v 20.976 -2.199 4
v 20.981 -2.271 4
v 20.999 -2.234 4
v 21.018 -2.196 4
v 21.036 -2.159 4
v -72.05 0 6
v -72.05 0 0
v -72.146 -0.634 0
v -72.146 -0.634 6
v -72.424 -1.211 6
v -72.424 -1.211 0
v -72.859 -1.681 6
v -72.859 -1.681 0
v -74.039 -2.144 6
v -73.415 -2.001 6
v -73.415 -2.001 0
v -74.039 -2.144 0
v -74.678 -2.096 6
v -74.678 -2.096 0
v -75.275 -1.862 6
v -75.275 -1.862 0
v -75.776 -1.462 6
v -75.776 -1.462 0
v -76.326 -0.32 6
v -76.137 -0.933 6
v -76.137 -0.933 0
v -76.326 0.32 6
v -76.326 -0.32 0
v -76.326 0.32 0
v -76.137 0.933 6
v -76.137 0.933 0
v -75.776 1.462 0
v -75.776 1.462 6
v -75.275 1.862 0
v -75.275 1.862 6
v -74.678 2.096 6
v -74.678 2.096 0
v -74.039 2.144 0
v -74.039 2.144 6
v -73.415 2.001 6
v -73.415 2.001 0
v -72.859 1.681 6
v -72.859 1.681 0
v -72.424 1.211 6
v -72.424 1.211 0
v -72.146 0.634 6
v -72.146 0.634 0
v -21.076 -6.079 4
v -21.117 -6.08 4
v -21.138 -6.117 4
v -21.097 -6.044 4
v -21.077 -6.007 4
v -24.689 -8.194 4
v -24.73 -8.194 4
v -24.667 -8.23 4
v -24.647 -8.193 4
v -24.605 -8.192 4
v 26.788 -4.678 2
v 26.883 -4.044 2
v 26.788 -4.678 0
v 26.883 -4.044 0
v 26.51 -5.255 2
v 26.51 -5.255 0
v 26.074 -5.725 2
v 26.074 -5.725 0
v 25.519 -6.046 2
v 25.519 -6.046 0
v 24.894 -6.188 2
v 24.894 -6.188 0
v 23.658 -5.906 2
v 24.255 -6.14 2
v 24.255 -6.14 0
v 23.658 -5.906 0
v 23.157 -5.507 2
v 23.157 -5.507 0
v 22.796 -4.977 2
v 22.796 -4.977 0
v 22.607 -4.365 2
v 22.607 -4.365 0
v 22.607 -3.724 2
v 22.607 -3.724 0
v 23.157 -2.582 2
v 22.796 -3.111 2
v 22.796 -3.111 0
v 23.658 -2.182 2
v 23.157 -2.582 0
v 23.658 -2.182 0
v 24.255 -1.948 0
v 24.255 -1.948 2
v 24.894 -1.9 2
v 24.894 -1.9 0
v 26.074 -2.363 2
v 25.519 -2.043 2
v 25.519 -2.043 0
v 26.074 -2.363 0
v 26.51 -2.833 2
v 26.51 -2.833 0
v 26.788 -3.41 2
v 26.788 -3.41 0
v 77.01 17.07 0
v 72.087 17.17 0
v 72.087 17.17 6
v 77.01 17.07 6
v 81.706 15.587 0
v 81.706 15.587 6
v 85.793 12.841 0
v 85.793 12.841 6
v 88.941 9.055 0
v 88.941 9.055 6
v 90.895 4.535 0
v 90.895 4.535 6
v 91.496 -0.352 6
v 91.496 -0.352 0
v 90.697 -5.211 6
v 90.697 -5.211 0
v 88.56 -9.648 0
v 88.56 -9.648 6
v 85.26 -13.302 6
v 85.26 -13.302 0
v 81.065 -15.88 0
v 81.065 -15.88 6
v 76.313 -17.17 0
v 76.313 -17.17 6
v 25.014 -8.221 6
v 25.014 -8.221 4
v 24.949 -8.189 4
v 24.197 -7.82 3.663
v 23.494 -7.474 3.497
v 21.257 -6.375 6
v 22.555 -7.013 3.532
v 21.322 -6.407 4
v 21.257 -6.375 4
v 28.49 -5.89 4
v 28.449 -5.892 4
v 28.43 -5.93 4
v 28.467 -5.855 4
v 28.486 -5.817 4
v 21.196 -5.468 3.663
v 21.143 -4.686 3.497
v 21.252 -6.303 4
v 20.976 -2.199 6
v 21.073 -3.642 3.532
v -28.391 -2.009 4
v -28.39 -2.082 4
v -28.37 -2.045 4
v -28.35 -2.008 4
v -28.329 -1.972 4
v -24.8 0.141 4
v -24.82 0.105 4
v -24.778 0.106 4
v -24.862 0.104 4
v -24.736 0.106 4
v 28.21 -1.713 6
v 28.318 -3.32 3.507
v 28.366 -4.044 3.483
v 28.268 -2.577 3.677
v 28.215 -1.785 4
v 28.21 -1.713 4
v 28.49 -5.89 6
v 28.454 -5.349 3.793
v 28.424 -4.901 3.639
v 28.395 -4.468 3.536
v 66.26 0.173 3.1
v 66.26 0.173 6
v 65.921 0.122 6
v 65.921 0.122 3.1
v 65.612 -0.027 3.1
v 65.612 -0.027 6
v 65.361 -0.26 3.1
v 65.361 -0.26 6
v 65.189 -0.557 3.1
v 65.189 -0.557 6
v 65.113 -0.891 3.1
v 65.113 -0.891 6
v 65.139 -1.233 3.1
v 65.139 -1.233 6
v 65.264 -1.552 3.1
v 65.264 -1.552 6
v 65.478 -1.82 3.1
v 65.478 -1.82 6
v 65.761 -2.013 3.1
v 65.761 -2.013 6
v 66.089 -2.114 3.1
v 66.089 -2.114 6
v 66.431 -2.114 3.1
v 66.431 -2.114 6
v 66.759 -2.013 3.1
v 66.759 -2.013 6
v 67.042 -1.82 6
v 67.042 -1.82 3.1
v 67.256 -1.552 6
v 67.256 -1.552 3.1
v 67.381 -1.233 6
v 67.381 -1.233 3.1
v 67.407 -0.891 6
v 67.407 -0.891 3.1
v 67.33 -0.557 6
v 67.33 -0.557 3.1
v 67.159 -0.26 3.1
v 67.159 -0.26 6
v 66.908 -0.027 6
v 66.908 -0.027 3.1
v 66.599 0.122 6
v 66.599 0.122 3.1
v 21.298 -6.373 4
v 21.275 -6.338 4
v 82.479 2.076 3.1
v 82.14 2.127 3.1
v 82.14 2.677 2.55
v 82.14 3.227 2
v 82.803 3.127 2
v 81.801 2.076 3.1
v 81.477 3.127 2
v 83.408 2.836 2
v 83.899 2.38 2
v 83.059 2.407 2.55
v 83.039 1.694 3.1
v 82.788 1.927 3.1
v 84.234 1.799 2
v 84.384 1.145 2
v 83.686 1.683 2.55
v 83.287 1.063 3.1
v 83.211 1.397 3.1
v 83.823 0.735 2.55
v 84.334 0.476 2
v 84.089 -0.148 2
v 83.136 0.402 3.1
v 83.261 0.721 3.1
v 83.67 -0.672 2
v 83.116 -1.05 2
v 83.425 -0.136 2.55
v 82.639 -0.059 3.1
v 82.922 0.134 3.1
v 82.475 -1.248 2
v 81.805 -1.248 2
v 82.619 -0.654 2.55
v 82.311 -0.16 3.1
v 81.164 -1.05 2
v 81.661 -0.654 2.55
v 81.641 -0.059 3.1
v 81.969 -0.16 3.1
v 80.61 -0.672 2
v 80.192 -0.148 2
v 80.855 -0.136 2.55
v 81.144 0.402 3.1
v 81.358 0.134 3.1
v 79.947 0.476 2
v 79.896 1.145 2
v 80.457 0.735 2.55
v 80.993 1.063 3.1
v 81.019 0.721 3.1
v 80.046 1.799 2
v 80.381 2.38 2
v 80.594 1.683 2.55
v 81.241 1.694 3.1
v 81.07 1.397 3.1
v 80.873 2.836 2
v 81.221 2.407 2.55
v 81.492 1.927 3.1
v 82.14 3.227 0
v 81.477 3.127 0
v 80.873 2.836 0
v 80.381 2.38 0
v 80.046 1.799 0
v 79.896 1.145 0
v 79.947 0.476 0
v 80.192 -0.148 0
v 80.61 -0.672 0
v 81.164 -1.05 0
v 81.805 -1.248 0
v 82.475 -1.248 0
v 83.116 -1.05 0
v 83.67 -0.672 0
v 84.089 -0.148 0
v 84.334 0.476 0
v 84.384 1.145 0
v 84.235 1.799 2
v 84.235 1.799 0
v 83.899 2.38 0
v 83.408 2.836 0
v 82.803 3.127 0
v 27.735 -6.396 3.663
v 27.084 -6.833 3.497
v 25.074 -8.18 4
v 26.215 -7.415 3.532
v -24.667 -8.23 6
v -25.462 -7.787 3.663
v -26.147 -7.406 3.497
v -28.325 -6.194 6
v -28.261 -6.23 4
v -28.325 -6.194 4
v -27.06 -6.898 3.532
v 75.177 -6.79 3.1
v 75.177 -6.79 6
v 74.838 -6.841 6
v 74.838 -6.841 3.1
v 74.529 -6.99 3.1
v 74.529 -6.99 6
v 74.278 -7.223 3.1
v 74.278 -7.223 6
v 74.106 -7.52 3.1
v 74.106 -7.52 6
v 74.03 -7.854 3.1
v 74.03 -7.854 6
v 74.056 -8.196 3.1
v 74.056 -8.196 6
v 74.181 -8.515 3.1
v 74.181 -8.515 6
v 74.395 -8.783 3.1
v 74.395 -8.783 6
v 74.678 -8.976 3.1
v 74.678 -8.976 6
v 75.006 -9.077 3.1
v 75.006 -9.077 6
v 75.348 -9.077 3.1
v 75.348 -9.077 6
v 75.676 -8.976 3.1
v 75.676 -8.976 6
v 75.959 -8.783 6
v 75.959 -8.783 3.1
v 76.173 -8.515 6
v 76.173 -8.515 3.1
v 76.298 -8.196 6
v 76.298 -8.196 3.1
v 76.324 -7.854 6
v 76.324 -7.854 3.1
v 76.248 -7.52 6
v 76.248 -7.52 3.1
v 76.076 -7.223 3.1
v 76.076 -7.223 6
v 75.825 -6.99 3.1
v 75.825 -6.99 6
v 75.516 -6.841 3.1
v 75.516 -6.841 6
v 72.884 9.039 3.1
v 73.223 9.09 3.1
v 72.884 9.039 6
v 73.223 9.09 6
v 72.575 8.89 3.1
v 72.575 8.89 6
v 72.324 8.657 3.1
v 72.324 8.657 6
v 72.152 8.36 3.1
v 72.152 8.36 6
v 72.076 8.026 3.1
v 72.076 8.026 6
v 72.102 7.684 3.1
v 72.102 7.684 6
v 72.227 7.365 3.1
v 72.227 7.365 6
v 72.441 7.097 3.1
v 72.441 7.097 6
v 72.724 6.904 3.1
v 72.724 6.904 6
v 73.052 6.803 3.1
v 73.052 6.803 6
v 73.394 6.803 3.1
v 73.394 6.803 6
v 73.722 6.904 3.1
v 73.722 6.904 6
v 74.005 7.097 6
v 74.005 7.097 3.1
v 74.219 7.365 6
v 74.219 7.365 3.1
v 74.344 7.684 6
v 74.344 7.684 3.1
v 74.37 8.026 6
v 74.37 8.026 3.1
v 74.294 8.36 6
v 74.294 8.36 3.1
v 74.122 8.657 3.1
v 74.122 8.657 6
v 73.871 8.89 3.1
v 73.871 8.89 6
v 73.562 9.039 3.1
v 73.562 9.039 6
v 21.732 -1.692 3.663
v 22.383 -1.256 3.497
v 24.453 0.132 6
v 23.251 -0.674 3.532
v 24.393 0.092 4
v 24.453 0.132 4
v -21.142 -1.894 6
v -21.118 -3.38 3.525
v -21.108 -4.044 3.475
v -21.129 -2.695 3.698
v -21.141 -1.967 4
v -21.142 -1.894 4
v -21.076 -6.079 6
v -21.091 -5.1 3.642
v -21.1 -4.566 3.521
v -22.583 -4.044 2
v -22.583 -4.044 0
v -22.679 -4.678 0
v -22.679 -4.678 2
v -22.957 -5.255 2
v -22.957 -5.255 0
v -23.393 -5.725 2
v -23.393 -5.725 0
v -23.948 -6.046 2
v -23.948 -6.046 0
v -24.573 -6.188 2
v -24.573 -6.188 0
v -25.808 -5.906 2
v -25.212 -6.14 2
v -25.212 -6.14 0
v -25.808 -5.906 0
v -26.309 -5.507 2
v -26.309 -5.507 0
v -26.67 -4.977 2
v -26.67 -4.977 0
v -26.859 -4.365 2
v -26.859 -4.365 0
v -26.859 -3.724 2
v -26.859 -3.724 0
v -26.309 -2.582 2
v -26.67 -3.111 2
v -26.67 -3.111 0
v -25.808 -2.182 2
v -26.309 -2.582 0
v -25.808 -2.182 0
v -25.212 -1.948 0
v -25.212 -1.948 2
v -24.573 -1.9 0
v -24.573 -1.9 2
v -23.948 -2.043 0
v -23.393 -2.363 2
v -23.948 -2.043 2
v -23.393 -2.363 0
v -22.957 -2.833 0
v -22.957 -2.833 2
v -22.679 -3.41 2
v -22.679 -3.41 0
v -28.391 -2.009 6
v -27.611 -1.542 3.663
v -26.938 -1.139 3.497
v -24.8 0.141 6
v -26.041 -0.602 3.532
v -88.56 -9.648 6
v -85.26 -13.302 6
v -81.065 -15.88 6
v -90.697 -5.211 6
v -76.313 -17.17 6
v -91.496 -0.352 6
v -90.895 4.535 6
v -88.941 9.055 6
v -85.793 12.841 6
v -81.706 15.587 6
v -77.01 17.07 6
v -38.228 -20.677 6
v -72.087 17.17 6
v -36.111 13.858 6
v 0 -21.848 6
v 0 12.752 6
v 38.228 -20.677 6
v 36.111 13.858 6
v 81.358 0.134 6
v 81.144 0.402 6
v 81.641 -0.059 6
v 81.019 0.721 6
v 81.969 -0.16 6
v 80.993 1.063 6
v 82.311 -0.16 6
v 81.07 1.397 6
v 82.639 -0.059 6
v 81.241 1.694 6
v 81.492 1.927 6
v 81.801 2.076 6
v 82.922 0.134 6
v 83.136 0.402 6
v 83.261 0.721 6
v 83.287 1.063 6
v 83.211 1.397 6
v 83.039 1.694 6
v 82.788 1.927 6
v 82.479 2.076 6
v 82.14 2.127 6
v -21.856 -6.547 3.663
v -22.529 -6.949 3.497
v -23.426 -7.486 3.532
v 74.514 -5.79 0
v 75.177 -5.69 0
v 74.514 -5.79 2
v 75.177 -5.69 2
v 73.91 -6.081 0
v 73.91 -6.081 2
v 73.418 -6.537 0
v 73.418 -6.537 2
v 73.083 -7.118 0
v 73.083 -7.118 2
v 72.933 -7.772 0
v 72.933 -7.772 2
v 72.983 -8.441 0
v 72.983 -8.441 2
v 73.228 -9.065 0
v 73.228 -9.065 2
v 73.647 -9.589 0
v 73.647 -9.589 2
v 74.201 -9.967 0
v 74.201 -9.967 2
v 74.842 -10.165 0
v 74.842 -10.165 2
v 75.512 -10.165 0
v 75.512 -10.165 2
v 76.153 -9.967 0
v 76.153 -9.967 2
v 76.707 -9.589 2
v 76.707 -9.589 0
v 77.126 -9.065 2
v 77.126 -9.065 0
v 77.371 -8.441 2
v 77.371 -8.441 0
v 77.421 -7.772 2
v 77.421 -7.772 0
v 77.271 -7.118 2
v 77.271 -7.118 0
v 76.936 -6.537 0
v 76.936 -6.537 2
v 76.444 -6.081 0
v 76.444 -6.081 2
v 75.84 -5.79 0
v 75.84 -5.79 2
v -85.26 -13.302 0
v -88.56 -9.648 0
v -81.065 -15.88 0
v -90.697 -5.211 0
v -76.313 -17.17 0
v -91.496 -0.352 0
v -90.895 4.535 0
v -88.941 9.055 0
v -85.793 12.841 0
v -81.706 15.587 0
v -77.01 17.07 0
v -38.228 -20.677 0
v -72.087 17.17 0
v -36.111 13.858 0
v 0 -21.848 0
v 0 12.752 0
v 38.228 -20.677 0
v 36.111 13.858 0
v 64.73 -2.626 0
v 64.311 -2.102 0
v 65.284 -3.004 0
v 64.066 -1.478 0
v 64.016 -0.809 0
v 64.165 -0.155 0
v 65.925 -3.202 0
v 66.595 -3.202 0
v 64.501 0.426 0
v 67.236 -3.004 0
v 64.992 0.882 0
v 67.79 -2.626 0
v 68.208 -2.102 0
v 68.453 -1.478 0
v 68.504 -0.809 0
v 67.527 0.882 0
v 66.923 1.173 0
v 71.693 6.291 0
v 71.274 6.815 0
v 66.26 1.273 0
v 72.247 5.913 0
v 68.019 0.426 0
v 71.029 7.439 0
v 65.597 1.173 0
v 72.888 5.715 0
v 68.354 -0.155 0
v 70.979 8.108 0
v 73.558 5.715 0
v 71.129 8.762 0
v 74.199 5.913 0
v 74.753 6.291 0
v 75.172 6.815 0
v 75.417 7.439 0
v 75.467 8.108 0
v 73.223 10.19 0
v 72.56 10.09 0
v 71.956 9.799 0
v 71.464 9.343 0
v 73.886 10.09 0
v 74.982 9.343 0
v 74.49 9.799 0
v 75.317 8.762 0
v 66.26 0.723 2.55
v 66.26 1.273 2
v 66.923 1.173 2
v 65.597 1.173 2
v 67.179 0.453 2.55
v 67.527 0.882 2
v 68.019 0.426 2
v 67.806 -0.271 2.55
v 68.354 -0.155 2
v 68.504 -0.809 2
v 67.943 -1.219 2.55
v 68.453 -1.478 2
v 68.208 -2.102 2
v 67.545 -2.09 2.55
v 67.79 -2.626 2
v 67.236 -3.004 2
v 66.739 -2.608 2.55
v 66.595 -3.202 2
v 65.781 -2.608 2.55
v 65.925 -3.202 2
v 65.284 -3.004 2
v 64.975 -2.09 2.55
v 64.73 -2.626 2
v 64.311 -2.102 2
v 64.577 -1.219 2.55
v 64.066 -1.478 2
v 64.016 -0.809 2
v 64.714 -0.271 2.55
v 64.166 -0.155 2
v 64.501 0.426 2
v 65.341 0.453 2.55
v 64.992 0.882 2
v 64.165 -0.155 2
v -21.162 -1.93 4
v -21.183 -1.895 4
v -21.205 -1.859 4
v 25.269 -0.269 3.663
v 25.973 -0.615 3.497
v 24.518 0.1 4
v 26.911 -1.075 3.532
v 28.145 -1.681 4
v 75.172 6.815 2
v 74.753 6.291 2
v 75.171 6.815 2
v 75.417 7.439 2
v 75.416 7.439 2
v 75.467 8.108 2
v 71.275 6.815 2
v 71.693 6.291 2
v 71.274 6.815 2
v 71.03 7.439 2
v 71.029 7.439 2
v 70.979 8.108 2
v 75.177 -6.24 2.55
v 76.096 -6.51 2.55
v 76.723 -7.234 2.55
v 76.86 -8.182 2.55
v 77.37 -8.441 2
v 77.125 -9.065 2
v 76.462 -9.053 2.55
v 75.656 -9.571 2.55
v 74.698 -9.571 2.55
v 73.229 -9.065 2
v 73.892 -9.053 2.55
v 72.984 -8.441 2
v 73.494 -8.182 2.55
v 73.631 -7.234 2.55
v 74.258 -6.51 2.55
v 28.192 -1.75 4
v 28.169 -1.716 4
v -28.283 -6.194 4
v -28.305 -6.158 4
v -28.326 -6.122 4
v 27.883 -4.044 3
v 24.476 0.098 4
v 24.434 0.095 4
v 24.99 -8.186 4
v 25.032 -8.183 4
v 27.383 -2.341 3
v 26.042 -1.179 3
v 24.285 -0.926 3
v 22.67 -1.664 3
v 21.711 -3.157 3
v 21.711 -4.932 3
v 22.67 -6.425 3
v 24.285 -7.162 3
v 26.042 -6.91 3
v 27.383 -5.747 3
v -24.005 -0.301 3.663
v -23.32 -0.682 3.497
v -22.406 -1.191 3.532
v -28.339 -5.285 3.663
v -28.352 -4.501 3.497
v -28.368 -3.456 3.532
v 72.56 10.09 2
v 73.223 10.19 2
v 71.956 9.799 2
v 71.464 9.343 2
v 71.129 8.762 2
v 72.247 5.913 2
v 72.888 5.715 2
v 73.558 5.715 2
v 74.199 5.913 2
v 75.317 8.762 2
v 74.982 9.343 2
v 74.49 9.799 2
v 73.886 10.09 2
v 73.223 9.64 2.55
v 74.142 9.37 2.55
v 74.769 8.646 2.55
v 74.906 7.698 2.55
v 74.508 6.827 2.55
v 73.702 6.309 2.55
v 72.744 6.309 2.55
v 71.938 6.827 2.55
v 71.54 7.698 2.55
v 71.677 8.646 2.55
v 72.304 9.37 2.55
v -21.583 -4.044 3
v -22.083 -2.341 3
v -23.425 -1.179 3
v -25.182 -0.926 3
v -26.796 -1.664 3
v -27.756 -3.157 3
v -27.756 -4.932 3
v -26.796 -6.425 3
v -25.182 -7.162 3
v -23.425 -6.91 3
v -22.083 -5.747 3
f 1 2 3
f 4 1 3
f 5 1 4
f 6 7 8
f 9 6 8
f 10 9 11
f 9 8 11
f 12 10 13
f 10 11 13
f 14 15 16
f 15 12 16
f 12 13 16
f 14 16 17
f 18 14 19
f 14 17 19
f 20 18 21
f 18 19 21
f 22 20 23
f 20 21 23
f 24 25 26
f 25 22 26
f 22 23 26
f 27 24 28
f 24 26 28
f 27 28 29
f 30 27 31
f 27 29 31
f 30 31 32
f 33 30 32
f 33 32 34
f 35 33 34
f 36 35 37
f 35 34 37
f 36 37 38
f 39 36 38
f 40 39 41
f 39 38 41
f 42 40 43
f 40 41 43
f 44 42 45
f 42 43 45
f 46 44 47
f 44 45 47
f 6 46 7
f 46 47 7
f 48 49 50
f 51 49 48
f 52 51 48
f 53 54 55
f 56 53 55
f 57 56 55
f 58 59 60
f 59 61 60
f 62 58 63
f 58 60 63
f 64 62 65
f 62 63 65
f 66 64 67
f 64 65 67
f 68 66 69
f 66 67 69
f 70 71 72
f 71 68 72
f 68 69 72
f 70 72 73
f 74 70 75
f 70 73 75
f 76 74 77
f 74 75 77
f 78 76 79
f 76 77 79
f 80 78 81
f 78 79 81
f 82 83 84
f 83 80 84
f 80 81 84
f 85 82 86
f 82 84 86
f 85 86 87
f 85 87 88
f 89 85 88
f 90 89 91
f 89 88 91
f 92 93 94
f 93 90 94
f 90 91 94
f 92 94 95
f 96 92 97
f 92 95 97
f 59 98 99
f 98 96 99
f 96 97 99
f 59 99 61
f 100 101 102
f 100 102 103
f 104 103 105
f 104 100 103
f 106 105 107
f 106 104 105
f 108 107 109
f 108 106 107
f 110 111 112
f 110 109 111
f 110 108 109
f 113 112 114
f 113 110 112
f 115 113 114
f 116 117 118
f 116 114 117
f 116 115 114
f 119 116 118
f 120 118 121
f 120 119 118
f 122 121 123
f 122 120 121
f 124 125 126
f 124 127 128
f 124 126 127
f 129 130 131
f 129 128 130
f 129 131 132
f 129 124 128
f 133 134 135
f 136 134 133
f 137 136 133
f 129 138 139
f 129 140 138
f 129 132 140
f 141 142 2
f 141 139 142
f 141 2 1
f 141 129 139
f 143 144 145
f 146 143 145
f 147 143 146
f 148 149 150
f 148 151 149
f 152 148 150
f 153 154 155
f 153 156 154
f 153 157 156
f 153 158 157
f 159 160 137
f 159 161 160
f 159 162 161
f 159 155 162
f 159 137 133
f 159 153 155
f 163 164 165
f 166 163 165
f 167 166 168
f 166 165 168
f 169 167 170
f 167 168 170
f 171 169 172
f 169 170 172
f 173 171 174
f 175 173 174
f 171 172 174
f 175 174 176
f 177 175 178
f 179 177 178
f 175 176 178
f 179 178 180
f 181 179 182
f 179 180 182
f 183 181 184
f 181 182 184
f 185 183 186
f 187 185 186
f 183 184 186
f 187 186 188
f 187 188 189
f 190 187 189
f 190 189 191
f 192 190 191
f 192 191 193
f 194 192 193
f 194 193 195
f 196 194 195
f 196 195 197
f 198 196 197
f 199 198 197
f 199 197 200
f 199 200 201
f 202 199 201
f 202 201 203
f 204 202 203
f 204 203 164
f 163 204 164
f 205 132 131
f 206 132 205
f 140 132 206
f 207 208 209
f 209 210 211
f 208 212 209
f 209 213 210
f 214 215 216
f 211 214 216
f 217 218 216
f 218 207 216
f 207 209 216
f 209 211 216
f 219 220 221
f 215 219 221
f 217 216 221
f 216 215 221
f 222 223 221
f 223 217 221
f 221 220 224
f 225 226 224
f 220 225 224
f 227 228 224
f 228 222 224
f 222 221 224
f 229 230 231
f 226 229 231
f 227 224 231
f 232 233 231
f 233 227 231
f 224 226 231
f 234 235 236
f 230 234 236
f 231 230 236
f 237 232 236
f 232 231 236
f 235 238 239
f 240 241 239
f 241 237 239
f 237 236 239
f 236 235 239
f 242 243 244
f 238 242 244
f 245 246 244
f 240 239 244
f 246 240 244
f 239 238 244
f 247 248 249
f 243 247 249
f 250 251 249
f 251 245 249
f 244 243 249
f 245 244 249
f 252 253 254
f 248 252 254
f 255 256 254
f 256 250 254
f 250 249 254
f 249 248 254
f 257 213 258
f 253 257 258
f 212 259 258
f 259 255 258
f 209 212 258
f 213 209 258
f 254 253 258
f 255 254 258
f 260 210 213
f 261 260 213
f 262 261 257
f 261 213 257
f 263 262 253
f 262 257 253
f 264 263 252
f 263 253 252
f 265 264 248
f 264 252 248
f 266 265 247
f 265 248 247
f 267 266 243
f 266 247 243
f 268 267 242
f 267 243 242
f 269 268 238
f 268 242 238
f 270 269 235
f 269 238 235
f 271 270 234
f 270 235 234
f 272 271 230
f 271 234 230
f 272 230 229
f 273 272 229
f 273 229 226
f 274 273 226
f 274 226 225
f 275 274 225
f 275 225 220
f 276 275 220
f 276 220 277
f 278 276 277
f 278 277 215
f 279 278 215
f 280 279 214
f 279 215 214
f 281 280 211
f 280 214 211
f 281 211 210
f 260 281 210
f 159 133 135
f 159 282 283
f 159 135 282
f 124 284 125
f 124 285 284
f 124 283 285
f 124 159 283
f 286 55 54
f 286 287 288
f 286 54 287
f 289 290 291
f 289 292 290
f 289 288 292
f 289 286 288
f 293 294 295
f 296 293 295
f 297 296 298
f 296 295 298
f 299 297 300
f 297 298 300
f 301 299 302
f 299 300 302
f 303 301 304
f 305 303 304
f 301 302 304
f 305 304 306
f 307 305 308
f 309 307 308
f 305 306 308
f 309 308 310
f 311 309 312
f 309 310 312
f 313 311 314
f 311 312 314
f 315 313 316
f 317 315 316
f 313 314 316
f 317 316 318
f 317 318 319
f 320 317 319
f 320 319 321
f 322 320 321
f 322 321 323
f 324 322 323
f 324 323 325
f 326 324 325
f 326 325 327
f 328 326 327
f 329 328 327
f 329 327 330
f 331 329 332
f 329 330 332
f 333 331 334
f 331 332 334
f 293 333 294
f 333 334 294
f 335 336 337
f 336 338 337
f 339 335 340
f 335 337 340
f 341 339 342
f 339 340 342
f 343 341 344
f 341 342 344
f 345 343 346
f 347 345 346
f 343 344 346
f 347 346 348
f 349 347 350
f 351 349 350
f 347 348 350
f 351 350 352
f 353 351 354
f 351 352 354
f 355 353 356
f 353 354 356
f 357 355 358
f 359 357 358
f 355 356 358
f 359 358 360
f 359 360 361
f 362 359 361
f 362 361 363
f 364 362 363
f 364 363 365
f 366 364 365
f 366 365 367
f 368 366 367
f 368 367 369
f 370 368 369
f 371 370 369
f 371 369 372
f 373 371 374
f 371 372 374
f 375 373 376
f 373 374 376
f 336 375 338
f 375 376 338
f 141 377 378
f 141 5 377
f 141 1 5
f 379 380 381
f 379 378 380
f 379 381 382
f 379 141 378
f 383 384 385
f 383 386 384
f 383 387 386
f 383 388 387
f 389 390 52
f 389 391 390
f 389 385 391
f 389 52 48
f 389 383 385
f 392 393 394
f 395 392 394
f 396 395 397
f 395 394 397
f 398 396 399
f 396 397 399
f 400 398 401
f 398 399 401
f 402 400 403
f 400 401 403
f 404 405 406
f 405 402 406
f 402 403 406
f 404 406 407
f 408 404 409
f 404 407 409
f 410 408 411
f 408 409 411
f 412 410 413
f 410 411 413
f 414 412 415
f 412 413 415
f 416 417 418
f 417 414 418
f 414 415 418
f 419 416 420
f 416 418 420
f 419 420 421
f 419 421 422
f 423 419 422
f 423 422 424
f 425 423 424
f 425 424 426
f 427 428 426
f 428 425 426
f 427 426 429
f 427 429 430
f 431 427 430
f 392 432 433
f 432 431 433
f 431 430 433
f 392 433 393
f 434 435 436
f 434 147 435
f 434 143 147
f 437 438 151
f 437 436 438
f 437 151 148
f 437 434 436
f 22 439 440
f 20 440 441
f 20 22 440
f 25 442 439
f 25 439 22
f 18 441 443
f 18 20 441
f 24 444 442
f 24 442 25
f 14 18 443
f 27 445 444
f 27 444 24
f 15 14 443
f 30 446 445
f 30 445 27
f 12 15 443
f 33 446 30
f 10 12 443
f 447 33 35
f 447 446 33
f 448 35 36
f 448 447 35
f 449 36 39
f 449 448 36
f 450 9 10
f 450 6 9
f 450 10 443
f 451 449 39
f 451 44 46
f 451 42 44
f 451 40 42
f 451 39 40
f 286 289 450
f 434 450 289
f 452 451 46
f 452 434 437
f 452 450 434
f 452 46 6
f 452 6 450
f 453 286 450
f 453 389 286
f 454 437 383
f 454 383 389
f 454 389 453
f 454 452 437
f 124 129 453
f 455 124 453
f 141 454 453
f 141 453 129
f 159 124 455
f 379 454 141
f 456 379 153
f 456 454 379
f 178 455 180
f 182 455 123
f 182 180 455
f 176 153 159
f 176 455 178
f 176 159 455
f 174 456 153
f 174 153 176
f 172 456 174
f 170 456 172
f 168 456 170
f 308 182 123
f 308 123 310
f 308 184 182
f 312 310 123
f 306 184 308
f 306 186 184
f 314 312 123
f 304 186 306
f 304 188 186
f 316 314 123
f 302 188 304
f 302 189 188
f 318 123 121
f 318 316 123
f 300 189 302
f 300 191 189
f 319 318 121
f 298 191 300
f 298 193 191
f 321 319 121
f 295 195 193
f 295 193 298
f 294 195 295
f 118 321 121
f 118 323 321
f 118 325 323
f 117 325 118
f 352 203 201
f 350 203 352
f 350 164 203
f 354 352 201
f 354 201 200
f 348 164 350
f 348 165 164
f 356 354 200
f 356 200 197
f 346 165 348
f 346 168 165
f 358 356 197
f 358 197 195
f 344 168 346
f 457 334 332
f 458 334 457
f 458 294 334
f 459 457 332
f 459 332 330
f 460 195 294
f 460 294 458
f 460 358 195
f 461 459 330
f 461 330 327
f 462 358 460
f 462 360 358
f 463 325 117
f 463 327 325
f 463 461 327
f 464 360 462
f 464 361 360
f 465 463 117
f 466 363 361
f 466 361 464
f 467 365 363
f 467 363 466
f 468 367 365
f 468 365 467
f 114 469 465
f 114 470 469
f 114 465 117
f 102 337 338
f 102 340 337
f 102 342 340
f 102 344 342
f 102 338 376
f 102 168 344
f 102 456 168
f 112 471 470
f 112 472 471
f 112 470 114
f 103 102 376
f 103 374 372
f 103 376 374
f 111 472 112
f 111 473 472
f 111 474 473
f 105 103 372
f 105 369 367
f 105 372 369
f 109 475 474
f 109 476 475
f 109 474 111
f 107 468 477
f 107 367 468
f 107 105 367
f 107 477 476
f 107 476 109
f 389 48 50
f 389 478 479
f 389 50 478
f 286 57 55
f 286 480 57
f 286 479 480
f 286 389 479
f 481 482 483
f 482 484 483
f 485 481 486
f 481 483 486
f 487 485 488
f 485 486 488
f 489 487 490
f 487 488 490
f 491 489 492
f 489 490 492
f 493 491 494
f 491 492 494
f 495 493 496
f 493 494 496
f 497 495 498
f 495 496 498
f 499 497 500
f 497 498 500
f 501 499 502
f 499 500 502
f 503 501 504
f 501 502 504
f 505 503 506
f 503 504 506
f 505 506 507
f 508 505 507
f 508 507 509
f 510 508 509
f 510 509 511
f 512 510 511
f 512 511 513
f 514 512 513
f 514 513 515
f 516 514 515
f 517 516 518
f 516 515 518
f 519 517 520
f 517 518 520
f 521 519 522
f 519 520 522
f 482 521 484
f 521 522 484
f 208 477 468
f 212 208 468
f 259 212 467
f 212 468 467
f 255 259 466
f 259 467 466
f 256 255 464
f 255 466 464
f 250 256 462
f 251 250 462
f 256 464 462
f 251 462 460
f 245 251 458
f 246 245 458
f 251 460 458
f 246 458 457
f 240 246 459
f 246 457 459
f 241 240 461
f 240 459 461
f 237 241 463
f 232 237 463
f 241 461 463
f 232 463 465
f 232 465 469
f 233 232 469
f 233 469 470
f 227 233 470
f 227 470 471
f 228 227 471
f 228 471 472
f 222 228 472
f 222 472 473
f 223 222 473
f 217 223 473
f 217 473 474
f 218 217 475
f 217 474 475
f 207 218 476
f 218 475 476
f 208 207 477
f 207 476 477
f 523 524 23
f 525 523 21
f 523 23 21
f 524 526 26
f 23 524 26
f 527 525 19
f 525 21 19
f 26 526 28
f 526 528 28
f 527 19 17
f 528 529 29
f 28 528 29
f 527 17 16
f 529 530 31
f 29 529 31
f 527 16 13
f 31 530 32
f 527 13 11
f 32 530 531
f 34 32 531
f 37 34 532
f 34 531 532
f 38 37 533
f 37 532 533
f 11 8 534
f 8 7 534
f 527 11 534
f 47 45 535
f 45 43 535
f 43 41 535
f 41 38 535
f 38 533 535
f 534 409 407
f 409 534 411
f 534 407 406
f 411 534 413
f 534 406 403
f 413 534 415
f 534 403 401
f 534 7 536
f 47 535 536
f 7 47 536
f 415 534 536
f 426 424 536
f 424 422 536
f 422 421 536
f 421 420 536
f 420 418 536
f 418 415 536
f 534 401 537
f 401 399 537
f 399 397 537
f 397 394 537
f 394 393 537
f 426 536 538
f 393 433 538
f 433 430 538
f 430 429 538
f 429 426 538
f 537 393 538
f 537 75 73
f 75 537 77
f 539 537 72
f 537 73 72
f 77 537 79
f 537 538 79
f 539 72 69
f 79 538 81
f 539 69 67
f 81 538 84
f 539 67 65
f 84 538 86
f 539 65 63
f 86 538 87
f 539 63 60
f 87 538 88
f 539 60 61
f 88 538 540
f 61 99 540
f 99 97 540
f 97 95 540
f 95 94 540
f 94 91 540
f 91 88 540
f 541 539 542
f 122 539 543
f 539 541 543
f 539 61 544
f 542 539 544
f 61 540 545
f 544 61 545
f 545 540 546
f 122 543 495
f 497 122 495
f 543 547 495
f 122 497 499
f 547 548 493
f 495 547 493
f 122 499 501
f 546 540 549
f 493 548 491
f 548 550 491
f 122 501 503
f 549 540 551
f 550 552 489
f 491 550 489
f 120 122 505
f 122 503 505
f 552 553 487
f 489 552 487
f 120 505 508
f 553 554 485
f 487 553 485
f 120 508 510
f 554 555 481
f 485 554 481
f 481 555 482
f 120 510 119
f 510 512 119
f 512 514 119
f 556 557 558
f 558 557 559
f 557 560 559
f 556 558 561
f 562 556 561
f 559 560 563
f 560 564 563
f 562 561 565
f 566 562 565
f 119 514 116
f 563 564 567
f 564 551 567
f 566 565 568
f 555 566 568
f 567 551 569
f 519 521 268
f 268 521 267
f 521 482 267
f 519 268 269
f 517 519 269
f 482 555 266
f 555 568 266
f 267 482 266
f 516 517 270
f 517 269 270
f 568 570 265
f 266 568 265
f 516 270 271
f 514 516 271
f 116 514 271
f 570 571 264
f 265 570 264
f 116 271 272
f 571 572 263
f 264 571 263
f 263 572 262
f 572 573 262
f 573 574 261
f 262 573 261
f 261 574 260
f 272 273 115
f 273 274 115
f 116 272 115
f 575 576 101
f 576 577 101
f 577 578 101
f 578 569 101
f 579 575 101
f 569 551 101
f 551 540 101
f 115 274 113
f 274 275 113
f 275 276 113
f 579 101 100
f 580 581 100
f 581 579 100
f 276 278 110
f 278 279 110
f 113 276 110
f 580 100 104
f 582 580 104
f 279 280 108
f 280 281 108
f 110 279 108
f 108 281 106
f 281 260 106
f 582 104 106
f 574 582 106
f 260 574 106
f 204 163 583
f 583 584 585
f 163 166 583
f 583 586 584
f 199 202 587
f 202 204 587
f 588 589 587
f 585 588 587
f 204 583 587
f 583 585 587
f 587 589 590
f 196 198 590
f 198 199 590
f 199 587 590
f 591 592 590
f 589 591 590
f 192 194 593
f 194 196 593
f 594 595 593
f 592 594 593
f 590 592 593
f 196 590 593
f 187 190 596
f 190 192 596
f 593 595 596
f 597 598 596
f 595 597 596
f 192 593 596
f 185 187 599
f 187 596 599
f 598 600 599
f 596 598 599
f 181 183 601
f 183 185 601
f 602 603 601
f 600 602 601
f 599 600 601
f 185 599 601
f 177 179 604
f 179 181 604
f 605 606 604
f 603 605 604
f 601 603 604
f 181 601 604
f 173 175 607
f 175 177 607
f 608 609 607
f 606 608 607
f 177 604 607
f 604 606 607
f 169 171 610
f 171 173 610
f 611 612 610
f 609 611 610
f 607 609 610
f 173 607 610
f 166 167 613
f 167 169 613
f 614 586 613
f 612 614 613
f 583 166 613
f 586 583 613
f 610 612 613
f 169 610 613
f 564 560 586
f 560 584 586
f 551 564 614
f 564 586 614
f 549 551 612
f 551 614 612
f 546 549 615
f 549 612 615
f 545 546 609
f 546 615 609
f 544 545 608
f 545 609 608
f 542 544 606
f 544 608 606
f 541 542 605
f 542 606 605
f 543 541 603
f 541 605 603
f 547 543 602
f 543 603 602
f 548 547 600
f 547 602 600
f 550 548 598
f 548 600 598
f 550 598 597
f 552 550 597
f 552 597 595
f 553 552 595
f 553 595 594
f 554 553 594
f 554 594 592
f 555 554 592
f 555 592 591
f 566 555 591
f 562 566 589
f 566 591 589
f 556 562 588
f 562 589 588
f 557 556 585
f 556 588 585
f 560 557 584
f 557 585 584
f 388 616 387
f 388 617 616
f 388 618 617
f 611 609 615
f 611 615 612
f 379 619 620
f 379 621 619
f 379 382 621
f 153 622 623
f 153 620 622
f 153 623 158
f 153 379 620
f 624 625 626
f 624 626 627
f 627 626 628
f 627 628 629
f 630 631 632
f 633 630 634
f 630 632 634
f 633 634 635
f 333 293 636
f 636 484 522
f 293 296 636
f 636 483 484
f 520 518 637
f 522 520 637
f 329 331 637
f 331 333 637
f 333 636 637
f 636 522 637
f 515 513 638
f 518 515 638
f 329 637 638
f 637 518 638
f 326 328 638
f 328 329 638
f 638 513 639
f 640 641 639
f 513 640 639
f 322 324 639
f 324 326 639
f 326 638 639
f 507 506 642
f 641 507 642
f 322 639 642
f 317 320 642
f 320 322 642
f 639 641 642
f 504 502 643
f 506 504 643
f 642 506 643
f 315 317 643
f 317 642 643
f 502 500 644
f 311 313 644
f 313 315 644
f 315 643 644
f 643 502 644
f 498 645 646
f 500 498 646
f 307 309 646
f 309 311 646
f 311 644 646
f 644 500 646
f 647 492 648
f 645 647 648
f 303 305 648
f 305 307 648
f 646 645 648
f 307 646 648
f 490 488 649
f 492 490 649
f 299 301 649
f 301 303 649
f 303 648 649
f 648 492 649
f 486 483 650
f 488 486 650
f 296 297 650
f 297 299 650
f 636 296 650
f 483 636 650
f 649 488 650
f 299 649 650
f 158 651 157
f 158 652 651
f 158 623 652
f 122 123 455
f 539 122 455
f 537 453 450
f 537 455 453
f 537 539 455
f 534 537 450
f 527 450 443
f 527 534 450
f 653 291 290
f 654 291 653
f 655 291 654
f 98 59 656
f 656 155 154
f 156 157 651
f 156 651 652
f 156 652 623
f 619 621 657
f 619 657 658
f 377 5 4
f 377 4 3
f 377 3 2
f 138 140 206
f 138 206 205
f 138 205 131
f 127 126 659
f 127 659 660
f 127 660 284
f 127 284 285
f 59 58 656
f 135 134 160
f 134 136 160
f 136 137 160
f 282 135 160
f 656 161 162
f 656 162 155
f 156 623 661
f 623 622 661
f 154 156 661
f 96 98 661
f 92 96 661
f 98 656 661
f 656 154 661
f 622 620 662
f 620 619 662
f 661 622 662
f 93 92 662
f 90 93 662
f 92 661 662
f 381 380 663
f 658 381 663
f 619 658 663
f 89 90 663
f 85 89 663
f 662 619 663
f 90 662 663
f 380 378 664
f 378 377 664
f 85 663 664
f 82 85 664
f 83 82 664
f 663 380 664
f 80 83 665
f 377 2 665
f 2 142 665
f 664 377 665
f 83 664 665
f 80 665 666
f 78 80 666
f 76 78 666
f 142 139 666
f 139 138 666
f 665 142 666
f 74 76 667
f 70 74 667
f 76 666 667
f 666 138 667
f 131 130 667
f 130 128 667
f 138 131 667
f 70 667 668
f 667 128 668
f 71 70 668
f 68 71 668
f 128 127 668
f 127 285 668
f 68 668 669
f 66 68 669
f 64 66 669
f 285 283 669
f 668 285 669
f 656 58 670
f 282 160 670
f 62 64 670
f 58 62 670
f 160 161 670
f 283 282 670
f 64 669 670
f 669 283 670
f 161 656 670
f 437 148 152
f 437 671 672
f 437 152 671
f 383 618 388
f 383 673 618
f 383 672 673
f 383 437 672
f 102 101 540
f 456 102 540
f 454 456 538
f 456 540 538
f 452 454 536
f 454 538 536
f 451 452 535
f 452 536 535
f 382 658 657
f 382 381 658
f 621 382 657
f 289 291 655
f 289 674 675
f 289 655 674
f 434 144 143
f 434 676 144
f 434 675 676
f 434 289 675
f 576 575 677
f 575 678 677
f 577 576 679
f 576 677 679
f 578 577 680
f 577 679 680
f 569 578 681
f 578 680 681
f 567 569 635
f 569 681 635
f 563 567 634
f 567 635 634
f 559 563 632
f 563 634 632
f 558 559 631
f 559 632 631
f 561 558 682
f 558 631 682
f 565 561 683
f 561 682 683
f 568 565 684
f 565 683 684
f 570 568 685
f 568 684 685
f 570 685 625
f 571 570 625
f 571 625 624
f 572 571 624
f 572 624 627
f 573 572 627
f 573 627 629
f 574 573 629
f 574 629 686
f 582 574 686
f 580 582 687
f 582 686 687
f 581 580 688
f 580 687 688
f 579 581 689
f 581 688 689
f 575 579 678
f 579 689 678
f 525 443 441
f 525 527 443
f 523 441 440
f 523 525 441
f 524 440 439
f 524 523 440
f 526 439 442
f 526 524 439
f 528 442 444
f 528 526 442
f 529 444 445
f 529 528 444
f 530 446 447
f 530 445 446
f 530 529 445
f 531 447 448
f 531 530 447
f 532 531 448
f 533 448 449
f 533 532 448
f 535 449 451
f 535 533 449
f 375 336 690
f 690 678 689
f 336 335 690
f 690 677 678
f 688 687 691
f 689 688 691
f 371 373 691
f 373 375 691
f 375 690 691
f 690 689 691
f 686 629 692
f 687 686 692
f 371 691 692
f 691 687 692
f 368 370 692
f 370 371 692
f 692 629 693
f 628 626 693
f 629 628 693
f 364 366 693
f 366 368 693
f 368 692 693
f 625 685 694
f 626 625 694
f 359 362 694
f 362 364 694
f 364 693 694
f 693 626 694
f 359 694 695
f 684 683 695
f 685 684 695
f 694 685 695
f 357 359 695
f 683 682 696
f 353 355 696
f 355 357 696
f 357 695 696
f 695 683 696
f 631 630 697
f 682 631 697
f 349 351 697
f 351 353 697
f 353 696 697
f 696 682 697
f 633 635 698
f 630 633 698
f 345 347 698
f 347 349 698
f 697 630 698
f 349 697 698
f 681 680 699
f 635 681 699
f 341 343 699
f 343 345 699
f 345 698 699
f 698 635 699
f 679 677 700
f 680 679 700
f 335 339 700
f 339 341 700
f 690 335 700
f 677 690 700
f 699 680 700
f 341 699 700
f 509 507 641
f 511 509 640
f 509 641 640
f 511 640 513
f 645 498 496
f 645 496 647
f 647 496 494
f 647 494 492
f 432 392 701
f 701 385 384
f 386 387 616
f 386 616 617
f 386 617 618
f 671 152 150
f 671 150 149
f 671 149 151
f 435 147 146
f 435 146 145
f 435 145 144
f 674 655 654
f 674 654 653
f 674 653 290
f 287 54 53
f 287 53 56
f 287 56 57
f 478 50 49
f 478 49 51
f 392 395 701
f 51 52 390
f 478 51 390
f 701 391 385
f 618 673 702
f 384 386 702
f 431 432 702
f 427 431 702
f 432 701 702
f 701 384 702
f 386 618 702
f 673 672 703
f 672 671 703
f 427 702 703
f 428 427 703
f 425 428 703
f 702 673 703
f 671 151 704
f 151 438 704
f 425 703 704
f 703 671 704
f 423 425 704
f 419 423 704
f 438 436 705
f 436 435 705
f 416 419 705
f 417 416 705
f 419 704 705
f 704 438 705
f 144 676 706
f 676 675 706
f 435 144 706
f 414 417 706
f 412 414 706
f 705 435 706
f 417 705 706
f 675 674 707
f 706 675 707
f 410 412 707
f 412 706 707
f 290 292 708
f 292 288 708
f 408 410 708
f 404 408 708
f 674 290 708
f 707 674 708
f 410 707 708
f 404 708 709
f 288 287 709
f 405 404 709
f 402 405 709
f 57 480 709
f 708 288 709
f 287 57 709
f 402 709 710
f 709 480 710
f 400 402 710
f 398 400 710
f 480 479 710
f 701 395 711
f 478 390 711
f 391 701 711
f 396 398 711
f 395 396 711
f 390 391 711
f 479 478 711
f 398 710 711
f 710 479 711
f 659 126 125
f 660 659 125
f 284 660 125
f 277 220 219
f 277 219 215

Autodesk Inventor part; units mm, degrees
ref_plane "YZ Plane" through (0, 0, 0) normal (1, 0, 0) x (0, 1, 0)
ref_plane "XZ Plane" through (0, 0, 0) normal (0, 1, 0) x (-1, 0, 0)
ref_plane "XY Plane" through (0, 0, 0) normal (0, 0, 1) x (1, 0, 0)
sketch "Sketch1" plane through (0, 0, 0) normal (0, 0, 1) x (1, 0, 0)
  arc A0 (-74.2, 0) -> (74.2, 0) centre (0, 603.0231) ccw construction
  arc A1 (-76.3128, -17.1705) -> (76.3128, -17.1705) centre (0, 603.0231) ccw
  arc A2 (-72.0872, 17.1705) -> (72.0872, 17.1705) centre (0, 603.0231) ccw
  arc A3 (-72.0872, 17.1705) -> (-76.3128, -17.1705) centre (-74.2, 0) ccw
  arc A4 (76.3128, -17.1705) -> (72.0872, 17.1705) centre (74.2, 0) ccw
  line L0 (-159.9202, 0) -> (186.0645, 0) construction
  line L1 (0, 827.4607) -> (0, -503.7998) construction
  line L2 (74.2, 0) -> (74.2, 0) construction
  line L3 (74.2, 0) -> (91.3705, 2.1128) construction
  line L4 (74.2, 0) -> (72.0872, 17.1705) construction
  circle A5 centre (74.2, 0) radius 8 construction
  circle A6 centre (73.223, 7.9401) radius 1.15
  circle A7 centre (66.2599, -0.977) radius 1.15
  circle A8 centre (75.177, -7.9401) radius 1.15
  circle A9 centre (82.1401, 0.977) radius 1.15
  circle A10 centre (-74.2, 0) radius 2.15
  circle A11 centre (-24.7333, -4.0442) radius 2.15
  circle A12 centre (24.7333, -4.0442) radius 2.15
  point P0 (0, 0)
  dimension "d3" = 16
  dimension "d0" = 148.4
  dimension "d1" = 34.6
  dimension "d2" = 603.0231
  dimension "d4" = 2.3
  dimension "d7" = 360
  dimension "d9" = 49.4667
  dimension "d10" = 24.7333
  dimension "d11" = 4.3
  dimension "d12" = 4.3
  dimension "d13" = 4.3
  dimension "d46" = 7.015
extrude "Extrusion1" add sketch "Sketch1" along normal blind 6 contours A3 A2 A4 A1 | A6 | A7 | A8 | A9
sketch "Sketch2" plane through (0, 0, 6) normal (0, 0, 1) x (1, 0, 0)
  circle A0 centre (-24.7333, -4.0442) radius 2.15 projected
  line L0 (-21.0756, -6.0794) -> (-24.667, -8.2295)
  line L1 (-24.667, -8.2295) -> (-28.3247, -6.1943)
  line L2 (-28.3247, -6.1943) -> (-28.3911, -2.0091)
  line L3 (-28.3911, -2.0091) -> (-24.7997, 0.141)
  line L4 (-24.7997, 0.141) -> (-21.142, -1.8941)
  line L5 (-21.142, -1.8941) -> (-21.0756, -6.0794)
  circle A1 centre (24.7333, -4.0442) radius 2.15 projected
  line L6 (21.2567, -6.3753) -> (20.9762, -2.199)
  line L7 (20.9762, -2.199) -> (24.4529, 0.1321)
  line L8 (24.4529, 0.1321) -> (28.2099, -1.7132)
  line L9 (28.2099, -1.7132) -> (28.4904, -5.8895)
  line L10 (28.4904, -5.8895) -> (25.0138, -8.2206)
  line L11 (25.0138, -8.2206) -> (21.2567, -6.3753)
  point P0 (0, 0)
  dimension "d16" = 7.25
  dimension "d22" = 7.25
extrude "Extrusion2" cut sketch "Sketch2" against normal blind 2
chamfer "Chamfer1" distance 2 angle 45 2 edges at (-26.8833, -4.0442, 4) (22.5833, -4.0442, 4)
sketch "Sketch4" plane through (0, 0, 0) normal (0, 0, -1) x (-1, 0, 0)
  line L0 (-73.223, 7.9401) -> (-75.177, -7.9401) construction
  circle A0 centre (-74.2, 0) radius 8 construction
  line L1 (-66.2, 0) -> (-95.5949, 0) construction
  line L2 (-66.2, 0) -> (0, 0) construction
  circle A1 centre (-75.177, -7.9401) radius 1.15 construction
  circle A2 centre (-66.2599, -0.977) radius 1.15 construction
  circle A3 centre (-73.223, 7.9401) radius 1.15 construction
  circle A4 centre (-82.1401, 0.977) radius 1.15 construction
  dimension "d28" = 82.985
  dimension "d29" = 16
  dimension "d30" = 2.3
  dimension "d31" = 74.2
  dimension "d34" = 360
hole "Hole1" at (75.177, -7.9401, 0) at (82.1401, 0.977, 0) at (73.223, 7.9401, 0) at (66.2599, -0.977, 0) direction (0, 0, 1) diameter 2.3 end through all counterbore diameter 4.5 counterbore depth 2
chamfer "Chamfer2" distance 1.1 angle 45 4 edges at (75.177, -9.0901, 2) (82.1401, -0.173, 2) (66.2599, -2.127, 2) (73.223, 6.7901, 2)
equation "\"d9\" = 0.333333 * d0"
equation "\"d10\" = 0.5 * d9"
equation "\"d22\" = d16"
properties part number "Arm 12X"
